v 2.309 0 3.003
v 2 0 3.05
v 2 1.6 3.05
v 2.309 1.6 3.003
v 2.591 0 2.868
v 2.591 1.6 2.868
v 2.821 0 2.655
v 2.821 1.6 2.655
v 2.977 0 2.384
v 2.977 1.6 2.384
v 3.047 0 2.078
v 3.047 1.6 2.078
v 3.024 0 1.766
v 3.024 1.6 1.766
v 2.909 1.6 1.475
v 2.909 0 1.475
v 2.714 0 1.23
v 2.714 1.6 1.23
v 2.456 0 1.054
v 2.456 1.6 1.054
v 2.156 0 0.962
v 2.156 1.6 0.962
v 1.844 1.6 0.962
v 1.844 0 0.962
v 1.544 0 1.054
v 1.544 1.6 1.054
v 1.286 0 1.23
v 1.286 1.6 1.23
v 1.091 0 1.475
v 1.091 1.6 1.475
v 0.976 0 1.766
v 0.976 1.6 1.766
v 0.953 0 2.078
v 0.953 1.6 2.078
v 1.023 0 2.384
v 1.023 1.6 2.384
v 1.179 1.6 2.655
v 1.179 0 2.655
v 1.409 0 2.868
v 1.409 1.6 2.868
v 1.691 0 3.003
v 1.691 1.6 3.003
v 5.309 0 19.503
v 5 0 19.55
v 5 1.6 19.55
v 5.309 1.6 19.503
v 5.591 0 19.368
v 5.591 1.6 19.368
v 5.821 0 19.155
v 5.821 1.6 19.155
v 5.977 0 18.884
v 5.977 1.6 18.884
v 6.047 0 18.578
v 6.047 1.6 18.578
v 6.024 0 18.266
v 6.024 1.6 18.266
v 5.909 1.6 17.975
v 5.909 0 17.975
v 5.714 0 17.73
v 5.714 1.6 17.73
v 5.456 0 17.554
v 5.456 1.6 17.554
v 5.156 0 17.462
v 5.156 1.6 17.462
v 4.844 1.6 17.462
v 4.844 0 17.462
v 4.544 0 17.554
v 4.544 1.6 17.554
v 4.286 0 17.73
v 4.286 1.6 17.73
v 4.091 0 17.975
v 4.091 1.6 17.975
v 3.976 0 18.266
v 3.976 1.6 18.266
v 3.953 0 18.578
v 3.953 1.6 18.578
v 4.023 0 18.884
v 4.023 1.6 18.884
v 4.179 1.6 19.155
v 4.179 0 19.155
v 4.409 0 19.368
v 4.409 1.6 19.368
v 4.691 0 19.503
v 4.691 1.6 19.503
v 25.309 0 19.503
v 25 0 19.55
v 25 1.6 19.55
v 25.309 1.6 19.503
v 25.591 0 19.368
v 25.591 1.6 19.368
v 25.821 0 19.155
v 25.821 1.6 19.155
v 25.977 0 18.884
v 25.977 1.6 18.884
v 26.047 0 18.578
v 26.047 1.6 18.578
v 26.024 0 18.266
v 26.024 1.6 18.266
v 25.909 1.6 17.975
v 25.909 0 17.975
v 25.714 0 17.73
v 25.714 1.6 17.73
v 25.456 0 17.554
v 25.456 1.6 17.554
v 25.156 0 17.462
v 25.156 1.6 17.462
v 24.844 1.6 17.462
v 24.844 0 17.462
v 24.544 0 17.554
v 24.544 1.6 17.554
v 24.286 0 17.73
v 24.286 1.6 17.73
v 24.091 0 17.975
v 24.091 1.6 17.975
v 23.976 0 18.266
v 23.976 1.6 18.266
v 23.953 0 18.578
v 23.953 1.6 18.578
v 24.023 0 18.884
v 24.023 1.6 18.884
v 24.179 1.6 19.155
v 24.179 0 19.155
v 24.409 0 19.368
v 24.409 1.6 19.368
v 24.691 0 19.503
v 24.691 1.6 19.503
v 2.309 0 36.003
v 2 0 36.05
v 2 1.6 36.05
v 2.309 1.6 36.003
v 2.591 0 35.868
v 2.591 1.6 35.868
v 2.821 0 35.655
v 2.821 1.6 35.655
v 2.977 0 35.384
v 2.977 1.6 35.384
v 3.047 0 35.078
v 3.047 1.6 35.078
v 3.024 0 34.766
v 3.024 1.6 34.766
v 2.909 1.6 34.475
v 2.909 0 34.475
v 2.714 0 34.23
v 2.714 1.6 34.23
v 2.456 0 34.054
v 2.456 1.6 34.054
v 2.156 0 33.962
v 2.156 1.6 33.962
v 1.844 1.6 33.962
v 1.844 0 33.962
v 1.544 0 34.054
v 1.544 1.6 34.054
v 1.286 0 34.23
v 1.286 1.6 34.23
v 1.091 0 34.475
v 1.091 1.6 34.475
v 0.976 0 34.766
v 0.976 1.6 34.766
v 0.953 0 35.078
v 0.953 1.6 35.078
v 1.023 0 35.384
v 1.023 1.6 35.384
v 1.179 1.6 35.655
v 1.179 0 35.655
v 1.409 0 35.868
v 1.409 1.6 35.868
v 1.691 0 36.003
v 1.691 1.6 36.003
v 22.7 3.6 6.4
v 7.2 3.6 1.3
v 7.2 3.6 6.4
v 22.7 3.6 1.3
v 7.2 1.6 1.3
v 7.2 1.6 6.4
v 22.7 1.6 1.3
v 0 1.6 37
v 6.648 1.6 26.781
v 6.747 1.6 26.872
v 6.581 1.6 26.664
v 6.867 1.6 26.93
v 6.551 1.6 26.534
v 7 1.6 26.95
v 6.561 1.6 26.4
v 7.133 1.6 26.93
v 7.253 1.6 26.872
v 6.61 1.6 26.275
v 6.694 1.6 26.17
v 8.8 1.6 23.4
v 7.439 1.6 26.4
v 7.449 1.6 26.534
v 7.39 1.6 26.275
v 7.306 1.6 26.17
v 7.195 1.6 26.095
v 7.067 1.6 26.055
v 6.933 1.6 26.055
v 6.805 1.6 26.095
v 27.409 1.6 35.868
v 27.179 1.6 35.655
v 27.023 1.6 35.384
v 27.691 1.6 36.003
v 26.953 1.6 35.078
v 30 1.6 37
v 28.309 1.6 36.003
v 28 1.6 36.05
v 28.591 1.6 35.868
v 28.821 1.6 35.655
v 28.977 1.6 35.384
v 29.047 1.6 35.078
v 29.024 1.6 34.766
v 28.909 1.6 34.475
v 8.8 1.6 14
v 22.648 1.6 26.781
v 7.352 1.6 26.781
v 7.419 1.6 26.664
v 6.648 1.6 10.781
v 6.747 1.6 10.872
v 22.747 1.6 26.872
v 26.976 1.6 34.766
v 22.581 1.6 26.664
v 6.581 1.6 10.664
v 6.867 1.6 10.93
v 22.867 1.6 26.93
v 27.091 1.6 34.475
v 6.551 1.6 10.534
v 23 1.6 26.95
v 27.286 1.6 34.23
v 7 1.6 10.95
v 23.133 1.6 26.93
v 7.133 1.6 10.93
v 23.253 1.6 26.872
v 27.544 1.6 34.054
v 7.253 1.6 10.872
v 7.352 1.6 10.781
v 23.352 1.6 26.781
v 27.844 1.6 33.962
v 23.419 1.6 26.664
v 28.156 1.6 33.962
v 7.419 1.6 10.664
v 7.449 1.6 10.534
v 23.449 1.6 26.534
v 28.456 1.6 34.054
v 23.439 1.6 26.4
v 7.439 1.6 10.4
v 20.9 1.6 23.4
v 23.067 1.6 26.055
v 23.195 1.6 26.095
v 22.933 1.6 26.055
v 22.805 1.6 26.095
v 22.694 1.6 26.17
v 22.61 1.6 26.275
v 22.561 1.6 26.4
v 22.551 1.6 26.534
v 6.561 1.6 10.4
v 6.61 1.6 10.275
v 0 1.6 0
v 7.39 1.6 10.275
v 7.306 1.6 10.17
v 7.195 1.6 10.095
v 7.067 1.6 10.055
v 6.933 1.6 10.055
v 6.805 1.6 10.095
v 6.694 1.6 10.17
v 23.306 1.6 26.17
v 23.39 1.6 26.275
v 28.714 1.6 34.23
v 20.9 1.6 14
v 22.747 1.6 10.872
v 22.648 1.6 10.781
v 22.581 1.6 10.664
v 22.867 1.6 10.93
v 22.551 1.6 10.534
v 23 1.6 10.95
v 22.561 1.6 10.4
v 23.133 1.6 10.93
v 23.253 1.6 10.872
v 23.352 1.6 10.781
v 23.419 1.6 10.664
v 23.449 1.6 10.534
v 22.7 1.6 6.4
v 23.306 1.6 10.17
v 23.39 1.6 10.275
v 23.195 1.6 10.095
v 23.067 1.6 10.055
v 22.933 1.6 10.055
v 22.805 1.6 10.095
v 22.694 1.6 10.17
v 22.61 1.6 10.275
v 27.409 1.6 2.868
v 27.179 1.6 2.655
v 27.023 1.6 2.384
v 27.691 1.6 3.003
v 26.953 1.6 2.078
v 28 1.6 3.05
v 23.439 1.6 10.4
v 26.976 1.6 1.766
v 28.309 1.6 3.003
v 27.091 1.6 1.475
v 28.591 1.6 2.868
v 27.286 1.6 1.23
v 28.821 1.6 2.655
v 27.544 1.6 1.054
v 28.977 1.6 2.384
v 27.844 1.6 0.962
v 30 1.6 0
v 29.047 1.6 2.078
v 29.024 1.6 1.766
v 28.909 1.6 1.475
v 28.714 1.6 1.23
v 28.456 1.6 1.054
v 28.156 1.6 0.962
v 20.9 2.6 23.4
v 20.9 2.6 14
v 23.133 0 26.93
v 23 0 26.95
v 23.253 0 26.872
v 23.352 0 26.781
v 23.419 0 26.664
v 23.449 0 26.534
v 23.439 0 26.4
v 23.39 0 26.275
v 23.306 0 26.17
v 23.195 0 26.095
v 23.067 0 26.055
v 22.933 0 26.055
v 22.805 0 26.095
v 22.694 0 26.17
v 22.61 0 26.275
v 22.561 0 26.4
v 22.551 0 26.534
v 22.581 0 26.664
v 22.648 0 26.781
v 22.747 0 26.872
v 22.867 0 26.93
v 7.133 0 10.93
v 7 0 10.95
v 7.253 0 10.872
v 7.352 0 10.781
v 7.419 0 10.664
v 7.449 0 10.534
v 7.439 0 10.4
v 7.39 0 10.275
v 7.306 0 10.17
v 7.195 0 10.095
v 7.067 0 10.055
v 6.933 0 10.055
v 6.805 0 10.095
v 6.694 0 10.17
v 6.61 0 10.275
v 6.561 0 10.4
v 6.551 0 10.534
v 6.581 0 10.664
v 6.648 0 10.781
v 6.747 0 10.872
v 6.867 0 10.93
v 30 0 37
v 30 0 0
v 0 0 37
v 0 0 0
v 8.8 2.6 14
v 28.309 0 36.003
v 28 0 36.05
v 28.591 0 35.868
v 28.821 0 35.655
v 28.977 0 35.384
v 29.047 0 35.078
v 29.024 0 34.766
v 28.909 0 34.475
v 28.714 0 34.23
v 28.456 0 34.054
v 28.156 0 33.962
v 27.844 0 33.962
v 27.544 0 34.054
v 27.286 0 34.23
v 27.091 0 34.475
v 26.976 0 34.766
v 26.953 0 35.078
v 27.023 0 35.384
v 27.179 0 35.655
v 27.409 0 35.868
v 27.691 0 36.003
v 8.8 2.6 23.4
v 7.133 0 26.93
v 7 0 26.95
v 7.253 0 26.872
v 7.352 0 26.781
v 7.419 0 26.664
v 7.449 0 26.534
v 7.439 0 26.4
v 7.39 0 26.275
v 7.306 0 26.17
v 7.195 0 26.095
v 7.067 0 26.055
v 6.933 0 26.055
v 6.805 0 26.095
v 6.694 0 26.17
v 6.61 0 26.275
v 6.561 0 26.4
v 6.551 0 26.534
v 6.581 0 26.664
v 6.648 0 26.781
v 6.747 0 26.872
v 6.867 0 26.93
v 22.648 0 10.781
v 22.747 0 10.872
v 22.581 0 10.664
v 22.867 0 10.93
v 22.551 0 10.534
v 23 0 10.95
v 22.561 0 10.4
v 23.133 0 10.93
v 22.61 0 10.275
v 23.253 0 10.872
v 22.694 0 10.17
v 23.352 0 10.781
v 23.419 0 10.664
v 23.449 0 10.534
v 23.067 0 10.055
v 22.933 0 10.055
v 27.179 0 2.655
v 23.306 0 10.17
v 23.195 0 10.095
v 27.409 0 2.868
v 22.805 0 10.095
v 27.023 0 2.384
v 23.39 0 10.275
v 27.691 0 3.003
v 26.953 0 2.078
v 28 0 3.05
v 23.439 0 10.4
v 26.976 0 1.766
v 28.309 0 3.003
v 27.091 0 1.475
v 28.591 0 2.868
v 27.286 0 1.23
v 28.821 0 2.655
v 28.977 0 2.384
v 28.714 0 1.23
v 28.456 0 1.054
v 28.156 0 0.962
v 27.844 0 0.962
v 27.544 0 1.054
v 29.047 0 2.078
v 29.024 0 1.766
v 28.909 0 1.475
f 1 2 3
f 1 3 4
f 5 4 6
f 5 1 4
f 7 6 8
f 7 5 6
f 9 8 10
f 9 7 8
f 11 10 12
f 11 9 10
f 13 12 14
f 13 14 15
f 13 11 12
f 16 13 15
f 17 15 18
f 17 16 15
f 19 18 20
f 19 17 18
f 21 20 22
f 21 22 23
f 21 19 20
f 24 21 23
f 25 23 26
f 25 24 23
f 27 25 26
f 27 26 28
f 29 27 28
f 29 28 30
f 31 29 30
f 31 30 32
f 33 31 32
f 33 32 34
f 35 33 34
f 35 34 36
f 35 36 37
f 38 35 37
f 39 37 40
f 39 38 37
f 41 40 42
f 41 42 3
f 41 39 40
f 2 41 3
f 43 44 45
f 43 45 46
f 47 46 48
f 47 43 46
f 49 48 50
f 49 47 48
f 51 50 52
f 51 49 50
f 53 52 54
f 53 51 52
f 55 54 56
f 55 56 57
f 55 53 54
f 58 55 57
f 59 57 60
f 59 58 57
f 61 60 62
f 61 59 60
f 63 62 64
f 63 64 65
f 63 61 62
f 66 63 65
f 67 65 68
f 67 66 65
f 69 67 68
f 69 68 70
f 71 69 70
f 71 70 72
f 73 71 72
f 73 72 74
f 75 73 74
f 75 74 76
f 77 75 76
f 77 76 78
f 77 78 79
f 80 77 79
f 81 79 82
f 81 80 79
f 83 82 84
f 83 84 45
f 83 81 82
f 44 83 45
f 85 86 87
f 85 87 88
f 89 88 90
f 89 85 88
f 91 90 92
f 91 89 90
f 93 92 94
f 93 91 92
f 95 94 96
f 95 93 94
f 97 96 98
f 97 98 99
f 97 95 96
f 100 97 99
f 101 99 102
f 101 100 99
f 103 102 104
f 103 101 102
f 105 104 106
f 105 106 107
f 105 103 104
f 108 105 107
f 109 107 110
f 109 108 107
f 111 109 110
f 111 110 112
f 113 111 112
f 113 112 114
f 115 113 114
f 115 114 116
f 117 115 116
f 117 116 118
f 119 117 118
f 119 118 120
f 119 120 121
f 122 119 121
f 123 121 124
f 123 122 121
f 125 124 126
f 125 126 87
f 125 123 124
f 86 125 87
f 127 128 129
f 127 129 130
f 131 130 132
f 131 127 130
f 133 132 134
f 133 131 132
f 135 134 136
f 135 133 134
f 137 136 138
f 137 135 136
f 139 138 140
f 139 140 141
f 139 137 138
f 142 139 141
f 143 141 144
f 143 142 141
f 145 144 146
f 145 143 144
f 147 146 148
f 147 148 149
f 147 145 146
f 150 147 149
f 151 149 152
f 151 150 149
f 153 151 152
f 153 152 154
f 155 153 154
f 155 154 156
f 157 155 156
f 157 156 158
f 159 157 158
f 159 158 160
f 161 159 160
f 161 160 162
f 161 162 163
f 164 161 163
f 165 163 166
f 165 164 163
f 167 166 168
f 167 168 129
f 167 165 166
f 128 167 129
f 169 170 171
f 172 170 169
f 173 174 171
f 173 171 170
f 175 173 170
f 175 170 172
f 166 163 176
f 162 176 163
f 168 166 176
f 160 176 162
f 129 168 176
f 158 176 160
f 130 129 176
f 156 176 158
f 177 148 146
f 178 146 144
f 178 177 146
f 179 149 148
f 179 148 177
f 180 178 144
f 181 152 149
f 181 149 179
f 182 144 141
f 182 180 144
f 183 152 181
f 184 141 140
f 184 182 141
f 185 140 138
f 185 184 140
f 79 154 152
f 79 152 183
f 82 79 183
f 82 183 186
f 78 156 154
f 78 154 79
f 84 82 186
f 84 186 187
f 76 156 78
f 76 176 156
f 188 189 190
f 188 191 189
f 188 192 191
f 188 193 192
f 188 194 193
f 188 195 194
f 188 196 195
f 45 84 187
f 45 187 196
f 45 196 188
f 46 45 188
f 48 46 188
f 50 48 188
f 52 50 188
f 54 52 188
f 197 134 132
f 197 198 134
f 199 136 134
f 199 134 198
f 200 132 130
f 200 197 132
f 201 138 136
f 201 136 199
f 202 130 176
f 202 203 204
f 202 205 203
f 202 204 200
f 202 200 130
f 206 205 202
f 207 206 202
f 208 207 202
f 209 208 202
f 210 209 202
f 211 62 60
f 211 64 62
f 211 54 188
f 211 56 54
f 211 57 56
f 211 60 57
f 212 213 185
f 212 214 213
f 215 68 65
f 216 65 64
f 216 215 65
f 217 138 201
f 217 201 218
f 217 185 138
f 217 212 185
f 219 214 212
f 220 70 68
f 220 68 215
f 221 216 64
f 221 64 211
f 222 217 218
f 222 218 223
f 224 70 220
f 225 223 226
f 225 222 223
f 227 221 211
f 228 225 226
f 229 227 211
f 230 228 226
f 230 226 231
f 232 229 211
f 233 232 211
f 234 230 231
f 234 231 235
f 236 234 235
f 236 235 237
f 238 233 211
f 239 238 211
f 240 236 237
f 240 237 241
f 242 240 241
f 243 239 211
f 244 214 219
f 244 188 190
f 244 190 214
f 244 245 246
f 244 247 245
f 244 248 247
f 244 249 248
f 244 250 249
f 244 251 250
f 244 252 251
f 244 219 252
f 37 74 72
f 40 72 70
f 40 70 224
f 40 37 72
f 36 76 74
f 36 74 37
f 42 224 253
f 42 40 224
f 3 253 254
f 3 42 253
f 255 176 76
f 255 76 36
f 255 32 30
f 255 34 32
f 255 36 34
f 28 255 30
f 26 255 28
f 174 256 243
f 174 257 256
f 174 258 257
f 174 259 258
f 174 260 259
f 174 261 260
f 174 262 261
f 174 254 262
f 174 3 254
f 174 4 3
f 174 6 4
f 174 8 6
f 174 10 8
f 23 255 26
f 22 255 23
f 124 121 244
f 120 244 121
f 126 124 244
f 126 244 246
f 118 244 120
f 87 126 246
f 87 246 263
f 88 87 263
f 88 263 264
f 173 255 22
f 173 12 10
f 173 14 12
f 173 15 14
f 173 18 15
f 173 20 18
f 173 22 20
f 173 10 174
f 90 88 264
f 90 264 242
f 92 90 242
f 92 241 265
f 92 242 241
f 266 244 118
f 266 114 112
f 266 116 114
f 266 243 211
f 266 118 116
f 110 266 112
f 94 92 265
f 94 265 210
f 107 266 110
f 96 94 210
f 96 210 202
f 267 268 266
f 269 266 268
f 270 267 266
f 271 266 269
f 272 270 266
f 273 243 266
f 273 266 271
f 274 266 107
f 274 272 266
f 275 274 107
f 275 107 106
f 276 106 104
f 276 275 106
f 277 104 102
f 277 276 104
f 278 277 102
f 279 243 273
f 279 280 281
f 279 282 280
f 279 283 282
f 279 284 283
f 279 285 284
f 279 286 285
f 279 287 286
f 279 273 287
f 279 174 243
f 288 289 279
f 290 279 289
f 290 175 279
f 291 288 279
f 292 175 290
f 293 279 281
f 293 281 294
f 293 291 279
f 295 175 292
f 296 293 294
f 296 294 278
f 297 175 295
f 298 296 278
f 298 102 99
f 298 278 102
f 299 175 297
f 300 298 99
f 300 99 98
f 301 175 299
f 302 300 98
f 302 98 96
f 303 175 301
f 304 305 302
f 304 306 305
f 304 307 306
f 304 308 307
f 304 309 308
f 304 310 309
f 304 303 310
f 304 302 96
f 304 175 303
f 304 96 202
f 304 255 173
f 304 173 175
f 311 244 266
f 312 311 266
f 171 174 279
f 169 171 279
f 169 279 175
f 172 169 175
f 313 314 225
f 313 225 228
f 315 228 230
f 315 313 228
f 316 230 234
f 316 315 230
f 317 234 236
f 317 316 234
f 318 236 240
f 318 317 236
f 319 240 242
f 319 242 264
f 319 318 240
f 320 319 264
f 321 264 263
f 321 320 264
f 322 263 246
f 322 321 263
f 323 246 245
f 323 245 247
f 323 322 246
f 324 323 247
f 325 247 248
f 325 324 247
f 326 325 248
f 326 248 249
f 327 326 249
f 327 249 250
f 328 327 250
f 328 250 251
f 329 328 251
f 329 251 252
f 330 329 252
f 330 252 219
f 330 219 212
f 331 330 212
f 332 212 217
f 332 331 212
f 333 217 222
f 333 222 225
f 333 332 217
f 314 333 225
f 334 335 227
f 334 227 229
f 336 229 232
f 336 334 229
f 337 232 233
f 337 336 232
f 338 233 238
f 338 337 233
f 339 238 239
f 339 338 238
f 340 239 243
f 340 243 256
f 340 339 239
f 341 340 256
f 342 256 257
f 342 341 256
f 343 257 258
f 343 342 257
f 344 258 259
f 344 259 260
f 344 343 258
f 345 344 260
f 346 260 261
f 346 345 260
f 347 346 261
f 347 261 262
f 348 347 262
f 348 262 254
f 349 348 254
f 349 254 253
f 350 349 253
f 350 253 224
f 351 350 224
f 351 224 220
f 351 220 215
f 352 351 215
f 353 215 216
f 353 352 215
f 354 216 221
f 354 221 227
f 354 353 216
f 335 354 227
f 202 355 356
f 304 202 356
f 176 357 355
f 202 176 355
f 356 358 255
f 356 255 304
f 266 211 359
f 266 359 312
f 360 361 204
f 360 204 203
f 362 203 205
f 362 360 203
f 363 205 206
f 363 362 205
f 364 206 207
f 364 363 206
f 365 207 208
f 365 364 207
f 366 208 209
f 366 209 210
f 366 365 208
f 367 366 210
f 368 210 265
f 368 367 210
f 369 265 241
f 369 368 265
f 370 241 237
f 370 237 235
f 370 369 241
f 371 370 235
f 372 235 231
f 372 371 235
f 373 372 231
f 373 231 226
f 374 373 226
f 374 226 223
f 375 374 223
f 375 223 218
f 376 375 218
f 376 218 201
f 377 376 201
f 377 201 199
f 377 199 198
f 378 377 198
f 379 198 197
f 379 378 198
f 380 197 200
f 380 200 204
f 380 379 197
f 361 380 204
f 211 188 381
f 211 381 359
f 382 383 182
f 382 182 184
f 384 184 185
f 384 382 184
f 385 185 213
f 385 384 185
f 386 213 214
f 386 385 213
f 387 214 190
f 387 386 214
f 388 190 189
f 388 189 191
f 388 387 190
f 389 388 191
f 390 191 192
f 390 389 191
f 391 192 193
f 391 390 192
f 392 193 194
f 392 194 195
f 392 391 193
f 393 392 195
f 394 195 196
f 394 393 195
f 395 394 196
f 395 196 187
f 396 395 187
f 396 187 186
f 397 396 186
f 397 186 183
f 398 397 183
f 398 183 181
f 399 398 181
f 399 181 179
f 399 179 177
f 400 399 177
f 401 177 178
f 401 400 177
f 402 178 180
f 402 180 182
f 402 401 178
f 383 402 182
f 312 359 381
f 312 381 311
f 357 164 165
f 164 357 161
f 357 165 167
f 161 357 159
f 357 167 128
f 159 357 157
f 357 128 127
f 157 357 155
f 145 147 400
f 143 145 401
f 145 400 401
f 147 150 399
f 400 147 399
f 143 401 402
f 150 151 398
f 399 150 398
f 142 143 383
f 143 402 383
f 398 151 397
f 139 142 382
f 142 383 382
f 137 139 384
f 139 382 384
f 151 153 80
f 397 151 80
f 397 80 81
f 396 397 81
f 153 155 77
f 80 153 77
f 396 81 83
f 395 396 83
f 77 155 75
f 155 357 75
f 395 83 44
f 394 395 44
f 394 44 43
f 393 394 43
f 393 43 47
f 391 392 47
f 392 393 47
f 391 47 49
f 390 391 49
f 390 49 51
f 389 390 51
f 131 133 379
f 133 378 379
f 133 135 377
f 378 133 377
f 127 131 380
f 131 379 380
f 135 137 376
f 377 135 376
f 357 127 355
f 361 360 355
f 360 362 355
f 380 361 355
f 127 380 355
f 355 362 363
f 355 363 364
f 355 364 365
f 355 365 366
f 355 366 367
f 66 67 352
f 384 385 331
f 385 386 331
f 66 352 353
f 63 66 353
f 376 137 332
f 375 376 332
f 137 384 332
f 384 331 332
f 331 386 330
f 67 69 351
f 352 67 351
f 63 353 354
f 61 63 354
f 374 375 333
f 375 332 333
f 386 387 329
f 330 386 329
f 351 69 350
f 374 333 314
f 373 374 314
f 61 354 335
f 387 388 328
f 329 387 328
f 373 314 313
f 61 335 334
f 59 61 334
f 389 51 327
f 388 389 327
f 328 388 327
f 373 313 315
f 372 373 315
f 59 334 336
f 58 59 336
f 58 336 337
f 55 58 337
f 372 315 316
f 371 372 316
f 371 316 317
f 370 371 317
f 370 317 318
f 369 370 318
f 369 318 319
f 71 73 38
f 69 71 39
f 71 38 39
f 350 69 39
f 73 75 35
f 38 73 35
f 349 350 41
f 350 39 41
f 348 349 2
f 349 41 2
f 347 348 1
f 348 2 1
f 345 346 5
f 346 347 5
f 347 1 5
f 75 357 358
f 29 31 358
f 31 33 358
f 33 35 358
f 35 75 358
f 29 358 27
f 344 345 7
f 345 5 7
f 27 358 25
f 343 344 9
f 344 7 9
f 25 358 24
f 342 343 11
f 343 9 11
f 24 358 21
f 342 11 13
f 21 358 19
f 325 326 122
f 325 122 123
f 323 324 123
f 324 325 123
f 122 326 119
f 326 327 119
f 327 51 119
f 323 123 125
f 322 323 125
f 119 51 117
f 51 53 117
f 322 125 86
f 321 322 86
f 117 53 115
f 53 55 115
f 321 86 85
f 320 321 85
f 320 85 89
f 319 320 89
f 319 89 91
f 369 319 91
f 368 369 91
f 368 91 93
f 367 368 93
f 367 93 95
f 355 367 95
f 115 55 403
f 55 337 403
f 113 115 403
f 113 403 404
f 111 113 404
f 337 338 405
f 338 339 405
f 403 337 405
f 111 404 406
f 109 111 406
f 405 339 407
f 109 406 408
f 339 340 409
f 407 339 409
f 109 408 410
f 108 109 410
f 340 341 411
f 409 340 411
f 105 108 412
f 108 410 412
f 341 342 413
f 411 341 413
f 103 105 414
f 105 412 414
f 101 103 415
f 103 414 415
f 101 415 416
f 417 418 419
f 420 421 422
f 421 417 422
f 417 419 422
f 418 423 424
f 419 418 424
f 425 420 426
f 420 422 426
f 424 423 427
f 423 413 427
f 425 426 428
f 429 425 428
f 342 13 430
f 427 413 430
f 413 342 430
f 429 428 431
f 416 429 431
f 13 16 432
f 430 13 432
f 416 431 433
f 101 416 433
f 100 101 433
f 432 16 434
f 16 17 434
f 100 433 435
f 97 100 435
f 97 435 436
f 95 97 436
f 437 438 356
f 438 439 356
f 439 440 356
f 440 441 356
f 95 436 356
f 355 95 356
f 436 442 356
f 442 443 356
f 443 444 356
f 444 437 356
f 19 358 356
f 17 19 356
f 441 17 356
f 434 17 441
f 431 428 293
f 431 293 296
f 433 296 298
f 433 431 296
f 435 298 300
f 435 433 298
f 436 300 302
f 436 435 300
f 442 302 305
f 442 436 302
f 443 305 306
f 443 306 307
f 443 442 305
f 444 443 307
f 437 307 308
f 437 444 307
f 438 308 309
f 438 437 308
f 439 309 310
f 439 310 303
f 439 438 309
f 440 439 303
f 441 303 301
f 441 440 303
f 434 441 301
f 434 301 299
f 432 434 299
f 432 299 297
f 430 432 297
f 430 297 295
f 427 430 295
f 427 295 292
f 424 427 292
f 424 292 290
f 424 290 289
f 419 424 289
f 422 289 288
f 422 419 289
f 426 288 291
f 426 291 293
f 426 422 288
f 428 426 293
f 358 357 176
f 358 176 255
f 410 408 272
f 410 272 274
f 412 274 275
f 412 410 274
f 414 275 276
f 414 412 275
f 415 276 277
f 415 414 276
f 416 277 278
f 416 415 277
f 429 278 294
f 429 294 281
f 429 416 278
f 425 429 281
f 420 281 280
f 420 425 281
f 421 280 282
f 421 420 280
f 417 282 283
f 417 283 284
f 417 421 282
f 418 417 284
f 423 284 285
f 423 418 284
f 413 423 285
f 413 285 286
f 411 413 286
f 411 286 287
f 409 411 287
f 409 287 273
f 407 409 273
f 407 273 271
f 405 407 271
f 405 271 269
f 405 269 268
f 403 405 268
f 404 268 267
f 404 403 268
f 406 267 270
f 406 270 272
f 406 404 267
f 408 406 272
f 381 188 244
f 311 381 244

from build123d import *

# Parameters (mm, degrees)
SKETCH_1_W      = 30
SKETCH_1_H      = 37
SKETCH_1_R      = 1.05
SKETCH_1_R_2    = 0.45
EXTRUDE_1_DEPTH = 1.6
SKETCH_2_W      = 12.1
SKETCH_2_H      = 9.4
EXTRUDE_2_DEPTH = 1
SKETCH_3_W      = 15.5
SKETCH_3_H      = 5.1
EXTRUDE_3_DEPTH = 2


with BuildPart() as part:
    # 草图1 → 凸台-拉伸1 (new body)
    with BuildSketch(Plane(origin=(0, 0, 0), x_dir=(1, 0, 0), z_dir=(0, 1, 0))):
        with Locations((15, -18.5)):
            Rectangle(SKETCH_1_W, SKETCH_1_H)
        with Locations(Location((2, -2, 0), (0, 0, 270))):
            Circle(SKETCH_1_R, mode=Mode.SUBTRACT)
        with Locations(Location((28, -2, 0), (0, 0, 270))):
            Circle(SKETCH_1_R, mode=Mode.SUBTRACT)
        with Locations(Location((2, -35, 0), (0, 0, 270))):
            Circle(SKETCH_1_R, mode=Mode.SUBTRACT)
        with Locations(Location((28, -35, 0), (0, 0, 270))):
            Circle(SKETCH_1_R, mode=Mode.SUBTRACT)
        with Locations(Location((7, -10.5, 0), (0, 0, 270))):
            Circle(SKETCH_1_R_2, mode=Mode.SUBTRACT)
        with Locations(Location((23, -10.5, 0), (0, 0, 270))):
            Circle(SKETCH_1_R_2, mode=Mode.SUBTRACT)
        with Locations(Location((7, -26.5, 0), (0, 0, 270))):
            Circle(SKETCH_1_R_2, mode=Mode.SUBTRACT)
        with Locations(Location((23, -26.5, 0), (0, 0, 270))):
            Circle(SKETCH_1_R_2, mode=Mode.SUBTRACT)
        with Locations(Location((5, -18.5, 0), (0, 0, 270))):
            Circle(SKETCH_1_R, mode=Mode.SUBTRACT)
        with Locations(Location((25, -18.5, 0), (0, 0, 270))):
            Circle(SKETCH_1_R, mode=Mode.SUBTRACT)
    extrude(amount=EXTRUDE_1_DEPTH)

    # 草图2 → 凸台-拉伸2 (add)
    with BuildSketch(Plane(origin=(0, 1.6, 0), x_dir=(1, 0, 0), z_dir=(0, 1, 0))):
        with Locations((14.85, -18.7)):
            Rectangle(SKETCH_2_W, SKETCH_2_H)
    extrude(amount=EXTRUDE_2_DEPTH)

    # 草图3 → 凸台-拉伸3 (add)
    with BuildSketch(Plane(origin=(0, 1.6, 0), x_dir=(1, 0, 0), z_dir=(0, 1, 0))):
        with Locations((14.95, -3.85)):
            Rectangle(SKETCH_3_W, SKETCH_3_H)
    extrude(amount=EXTRUDE_3_DEPTH)


solid = part.part
